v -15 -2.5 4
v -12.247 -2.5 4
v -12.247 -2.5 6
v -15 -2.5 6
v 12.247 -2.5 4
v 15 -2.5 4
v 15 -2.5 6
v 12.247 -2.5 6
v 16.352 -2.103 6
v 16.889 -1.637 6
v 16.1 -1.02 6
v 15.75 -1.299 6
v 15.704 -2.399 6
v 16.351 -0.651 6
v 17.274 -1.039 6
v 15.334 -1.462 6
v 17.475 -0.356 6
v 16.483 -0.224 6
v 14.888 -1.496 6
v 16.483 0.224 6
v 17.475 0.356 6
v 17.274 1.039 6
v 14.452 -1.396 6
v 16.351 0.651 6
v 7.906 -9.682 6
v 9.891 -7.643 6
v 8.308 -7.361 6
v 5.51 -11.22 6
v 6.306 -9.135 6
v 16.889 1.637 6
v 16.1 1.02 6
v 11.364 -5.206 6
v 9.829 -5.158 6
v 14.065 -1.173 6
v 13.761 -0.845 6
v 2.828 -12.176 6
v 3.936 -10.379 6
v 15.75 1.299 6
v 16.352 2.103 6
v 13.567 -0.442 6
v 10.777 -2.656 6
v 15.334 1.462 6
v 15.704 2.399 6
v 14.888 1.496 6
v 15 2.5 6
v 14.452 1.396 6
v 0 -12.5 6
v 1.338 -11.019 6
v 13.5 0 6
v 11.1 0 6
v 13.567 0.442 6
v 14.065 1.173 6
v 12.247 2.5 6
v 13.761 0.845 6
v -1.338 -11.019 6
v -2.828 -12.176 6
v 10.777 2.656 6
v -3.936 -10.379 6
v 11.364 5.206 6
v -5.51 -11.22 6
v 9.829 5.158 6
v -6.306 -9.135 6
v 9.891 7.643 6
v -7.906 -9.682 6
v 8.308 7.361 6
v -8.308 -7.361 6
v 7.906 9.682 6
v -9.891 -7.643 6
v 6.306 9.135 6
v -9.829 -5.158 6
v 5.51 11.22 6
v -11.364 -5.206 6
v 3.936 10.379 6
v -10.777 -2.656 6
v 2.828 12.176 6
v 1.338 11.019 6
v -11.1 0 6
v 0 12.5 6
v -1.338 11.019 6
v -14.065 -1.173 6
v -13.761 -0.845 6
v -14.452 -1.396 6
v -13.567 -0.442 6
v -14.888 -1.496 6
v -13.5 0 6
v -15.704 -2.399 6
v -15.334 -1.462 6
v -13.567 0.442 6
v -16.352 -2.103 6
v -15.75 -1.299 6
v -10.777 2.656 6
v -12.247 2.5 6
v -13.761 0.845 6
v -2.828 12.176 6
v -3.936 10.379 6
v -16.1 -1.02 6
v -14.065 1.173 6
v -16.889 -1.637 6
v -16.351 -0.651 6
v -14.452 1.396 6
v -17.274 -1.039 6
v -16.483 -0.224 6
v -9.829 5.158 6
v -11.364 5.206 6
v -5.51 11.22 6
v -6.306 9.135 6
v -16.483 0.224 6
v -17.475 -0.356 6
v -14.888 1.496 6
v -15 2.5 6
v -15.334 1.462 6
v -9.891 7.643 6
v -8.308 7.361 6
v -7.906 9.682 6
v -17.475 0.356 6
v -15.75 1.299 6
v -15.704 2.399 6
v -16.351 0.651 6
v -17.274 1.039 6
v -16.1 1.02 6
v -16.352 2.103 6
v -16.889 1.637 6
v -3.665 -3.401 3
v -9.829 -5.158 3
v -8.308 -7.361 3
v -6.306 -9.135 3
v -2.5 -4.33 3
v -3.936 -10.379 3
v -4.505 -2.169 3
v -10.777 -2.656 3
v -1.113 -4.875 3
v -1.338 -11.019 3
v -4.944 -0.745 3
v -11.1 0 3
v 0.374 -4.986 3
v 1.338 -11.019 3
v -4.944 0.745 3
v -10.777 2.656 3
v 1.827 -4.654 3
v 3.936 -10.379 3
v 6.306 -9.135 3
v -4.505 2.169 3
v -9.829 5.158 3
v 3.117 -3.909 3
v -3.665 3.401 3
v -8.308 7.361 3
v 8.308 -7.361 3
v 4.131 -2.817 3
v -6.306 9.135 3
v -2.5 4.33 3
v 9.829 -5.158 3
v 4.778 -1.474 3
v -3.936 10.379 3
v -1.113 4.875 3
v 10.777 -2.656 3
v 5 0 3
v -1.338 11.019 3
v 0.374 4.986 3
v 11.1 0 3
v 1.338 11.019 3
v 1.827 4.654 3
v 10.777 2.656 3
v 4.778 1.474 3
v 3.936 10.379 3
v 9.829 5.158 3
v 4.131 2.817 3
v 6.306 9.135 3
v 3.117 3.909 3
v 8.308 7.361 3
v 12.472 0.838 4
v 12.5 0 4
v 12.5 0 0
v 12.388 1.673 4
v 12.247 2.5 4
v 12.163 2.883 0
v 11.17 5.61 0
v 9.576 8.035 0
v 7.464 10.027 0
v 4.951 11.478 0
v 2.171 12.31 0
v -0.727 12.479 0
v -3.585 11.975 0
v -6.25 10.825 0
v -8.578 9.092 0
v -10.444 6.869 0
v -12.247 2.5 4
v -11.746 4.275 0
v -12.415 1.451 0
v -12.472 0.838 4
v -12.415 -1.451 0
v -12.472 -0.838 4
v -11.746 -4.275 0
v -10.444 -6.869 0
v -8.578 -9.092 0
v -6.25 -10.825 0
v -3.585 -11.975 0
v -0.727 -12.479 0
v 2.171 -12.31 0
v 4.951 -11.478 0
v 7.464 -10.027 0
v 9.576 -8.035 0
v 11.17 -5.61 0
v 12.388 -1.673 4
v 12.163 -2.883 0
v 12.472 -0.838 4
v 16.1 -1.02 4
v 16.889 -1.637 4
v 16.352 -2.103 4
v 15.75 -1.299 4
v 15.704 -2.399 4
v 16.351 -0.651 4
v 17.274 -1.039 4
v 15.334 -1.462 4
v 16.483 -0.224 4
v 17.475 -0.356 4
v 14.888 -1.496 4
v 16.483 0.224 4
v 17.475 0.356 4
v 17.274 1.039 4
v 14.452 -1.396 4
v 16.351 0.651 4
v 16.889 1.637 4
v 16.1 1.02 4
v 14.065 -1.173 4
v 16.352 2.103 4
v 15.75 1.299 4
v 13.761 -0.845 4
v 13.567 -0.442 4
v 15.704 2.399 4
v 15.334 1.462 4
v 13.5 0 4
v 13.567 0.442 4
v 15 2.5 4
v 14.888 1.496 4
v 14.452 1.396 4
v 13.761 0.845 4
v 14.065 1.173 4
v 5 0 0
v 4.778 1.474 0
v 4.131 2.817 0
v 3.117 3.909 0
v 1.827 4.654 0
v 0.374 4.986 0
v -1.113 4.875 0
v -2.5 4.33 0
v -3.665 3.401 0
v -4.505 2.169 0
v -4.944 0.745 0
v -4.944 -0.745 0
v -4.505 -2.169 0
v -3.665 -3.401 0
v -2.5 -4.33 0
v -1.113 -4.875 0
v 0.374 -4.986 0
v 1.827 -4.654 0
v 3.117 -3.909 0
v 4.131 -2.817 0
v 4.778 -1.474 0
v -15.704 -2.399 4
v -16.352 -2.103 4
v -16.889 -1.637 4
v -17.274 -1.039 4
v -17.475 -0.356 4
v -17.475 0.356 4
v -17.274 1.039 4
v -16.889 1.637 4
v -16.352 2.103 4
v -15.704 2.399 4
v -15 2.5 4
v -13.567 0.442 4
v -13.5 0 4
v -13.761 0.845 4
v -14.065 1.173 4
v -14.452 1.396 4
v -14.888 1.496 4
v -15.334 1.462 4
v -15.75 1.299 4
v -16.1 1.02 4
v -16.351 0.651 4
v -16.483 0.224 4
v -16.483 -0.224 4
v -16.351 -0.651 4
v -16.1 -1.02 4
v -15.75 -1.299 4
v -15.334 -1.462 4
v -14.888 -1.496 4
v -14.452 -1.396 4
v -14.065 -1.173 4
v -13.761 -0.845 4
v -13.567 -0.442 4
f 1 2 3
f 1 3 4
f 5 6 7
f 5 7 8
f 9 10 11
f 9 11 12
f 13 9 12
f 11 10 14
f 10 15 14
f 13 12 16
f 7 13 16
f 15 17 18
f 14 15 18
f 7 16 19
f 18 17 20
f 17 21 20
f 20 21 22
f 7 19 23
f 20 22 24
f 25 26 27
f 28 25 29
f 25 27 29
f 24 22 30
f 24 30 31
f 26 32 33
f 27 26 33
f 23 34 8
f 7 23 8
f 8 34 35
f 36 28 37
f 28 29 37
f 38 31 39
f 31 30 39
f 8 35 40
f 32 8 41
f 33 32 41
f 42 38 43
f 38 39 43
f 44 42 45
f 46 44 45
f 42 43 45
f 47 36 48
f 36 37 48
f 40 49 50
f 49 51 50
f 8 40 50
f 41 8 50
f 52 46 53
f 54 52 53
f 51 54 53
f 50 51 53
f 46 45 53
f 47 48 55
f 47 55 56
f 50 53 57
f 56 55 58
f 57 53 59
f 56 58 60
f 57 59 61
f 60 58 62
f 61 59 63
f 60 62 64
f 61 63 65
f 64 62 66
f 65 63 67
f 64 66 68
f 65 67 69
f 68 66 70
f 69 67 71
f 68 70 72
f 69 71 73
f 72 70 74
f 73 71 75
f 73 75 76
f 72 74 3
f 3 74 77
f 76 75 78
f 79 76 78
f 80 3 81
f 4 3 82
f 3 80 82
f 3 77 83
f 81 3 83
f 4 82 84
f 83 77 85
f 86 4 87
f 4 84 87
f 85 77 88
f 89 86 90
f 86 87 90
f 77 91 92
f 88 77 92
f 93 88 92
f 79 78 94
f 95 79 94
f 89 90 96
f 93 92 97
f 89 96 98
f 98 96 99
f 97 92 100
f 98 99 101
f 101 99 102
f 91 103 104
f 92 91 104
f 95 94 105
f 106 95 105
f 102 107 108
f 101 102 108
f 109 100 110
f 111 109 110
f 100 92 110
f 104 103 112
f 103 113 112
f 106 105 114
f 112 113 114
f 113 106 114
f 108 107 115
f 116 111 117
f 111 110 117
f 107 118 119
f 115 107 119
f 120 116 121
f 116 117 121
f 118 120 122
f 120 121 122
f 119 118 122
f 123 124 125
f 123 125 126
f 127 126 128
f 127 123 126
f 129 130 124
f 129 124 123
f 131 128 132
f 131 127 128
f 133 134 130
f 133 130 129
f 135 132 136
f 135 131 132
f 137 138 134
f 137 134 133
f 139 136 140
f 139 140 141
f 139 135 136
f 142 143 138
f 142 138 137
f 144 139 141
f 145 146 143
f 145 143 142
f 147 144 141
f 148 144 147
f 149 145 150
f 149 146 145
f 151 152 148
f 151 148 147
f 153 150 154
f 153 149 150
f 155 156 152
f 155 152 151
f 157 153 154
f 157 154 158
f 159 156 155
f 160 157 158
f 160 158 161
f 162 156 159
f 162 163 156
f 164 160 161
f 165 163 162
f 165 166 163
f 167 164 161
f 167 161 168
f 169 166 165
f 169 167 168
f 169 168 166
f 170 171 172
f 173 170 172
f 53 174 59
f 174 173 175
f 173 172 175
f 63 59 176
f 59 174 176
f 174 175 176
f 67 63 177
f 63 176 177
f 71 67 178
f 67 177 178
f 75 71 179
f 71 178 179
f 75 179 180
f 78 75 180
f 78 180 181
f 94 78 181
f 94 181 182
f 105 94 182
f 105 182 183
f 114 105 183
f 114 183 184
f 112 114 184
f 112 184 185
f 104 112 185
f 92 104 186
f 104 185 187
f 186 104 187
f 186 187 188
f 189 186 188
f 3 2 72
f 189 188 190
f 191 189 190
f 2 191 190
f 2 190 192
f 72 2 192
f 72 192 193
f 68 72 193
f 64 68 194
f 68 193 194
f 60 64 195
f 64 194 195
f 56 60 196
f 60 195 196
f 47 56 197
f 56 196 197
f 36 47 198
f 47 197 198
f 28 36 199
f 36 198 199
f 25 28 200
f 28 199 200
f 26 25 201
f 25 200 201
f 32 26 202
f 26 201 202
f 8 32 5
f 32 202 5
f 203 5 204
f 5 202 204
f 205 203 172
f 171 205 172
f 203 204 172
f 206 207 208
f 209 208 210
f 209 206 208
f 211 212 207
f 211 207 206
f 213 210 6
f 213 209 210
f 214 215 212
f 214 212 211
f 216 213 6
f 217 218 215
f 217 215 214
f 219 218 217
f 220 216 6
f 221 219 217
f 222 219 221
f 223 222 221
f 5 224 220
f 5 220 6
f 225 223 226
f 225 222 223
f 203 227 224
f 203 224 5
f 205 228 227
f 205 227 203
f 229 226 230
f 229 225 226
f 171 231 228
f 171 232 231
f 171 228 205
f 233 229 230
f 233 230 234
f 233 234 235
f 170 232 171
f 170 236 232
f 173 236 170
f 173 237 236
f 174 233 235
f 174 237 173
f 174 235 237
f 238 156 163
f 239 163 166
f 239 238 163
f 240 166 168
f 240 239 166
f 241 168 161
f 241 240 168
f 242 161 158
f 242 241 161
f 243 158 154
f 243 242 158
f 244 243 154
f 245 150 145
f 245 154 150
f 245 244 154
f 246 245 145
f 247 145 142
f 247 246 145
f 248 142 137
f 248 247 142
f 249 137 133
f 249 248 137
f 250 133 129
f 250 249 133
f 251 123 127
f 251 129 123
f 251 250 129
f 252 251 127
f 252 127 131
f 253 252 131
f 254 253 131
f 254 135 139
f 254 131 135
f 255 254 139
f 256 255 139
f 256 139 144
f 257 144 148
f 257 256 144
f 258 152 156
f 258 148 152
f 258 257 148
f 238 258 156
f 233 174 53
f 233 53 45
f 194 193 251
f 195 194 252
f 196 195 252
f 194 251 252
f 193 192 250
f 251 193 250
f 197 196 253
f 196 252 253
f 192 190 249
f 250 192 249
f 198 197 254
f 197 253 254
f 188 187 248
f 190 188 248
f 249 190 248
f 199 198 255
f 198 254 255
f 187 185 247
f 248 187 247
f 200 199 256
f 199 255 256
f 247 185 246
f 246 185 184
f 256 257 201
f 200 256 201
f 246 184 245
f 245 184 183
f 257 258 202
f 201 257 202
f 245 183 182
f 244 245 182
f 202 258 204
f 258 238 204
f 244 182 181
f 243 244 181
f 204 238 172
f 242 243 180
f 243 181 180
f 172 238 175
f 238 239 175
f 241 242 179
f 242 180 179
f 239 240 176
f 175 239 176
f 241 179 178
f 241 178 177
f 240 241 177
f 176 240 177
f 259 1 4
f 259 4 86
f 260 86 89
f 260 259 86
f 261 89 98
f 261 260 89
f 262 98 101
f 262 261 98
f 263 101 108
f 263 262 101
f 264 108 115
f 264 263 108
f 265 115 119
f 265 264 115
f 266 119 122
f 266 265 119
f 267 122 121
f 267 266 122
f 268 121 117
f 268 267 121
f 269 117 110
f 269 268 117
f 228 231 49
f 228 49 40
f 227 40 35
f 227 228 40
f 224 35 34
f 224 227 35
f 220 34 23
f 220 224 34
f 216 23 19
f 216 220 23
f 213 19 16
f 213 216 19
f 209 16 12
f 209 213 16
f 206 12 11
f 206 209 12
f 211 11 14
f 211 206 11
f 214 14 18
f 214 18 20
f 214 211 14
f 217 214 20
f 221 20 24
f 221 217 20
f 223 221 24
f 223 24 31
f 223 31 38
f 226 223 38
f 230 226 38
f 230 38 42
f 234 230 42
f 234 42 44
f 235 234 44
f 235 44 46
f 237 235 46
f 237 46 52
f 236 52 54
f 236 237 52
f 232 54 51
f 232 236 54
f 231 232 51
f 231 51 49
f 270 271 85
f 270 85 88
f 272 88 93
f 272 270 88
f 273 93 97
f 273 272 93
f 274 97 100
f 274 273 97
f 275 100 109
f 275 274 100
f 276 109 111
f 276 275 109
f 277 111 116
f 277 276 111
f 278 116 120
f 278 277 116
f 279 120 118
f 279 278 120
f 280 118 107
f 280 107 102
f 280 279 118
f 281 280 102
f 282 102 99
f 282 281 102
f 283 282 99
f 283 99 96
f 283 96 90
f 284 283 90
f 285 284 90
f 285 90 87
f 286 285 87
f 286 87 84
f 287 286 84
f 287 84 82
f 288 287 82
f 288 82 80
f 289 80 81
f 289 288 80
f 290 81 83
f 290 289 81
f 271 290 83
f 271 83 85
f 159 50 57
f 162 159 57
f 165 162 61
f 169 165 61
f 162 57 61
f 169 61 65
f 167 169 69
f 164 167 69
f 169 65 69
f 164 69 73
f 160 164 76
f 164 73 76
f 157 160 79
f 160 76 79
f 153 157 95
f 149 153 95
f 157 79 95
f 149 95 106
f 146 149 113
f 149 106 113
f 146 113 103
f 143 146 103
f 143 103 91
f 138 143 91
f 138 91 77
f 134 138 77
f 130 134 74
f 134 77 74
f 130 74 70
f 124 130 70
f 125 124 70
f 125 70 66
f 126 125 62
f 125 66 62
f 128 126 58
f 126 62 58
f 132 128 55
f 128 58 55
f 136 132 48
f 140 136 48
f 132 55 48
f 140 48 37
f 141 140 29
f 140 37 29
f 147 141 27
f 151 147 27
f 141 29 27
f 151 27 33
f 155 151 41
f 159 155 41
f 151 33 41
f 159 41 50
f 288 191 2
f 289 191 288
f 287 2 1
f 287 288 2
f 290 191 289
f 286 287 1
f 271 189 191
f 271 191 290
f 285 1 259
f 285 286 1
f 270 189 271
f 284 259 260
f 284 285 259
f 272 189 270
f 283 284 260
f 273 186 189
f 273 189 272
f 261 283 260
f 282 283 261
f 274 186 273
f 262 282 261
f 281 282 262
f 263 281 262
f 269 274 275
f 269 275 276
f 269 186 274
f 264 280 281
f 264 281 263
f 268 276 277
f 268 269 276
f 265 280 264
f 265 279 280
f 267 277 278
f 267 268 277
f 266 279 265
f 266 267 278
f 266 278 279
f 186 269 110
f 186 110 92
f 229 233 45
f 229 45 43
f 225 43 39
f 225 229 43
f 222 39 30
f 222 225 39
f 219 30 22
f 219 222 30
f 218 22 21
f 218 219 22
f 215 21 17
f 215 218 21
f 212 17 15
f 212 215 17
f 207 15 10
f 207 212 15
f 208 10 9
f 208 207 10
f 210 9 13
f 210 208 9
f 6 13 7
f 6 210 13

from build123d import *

# Parameters (mm, degrees)
SKETCH2_R           = 12.5
SKETCH2_R_2         = 5
BOSS_EXTRUDE3_DEPTH = 6
SKETCH4_R           = 11.1
CUT_EXTRUDE1_DEPTH  = 3
BOSS_EXTRUDE4_START = -2
SKETCH5_R           = 1.5
BOSS_EXTRUDE4_DEPTH = 2


with BuildPart() as part:
    # Sketch2 → Boss-Extrude3 (new body)
    with BuildSketch(Plane.XY):
        Circle(SKETCH2_R)
        Circle(SKETCH2_R_2, mode=Mode.SUBTRACT)
    extrude(amount=BOSS_EXTRUDE3_DEPTH)

    # Sketch4 → Cut-Extrude1 (cut)
    with BuildSketch(Plane.XY.offset(6)):
        Circle(SKETCH4_R)
    extrude(amount=-CUT_EXTRUDE1_DEPTH, mode=Mode.SUBTRACT)

    # Sketch5 → Boss-Extrude4 (add)
    # profile 1 of 2: a face of its own
    with BuildSketch(Plane.XY.offset(6).offset(BOSS_EXTRUDE4_START)):
        with BuildLine():
            Line((-15, 2.5), (-12.247448714, 2.5))
            ThreePointArc((-12.247448714, 2.5), (-12.5, 0), (-12.247448714, -2.5))
            Line((-12.247448714, -2.5), (-15, -2.5))
            ThreePointArc((-15, -2.5), (-17.5, 0), (-15, 2.5))
        make_face()
        with Locations((-15, 0)):
            Circle(SKETCH5_R, mode=Mode.SUBTRACT)
    # profile 2 of 2: a face of its own
    with BuildSketch(Plane.XY.offset(6).offset(BOSS_EXTRUDE4_START)):
        with BuildLine():
            Line((15, -2.5), (12.247448714, -2.5))
            ThreePointArc((12.247448714, -2.5), (12.5, 0), (12.247448714, 2.5))
            Line((12.247448714, 2.5), (15, 2.5))
            ThreePointArc((15, 2.5), (17.5, 0), (15, -2.5))
        make_face()
        with Locations(Location((15, 0, 0), (0, 0, 180))):
            Circle(SKETCH5_R, mode=Mode.SUBTRACT)
    extrude(amount=BOSS_EXTRUDE4_DEPTH)


solid = part.part
